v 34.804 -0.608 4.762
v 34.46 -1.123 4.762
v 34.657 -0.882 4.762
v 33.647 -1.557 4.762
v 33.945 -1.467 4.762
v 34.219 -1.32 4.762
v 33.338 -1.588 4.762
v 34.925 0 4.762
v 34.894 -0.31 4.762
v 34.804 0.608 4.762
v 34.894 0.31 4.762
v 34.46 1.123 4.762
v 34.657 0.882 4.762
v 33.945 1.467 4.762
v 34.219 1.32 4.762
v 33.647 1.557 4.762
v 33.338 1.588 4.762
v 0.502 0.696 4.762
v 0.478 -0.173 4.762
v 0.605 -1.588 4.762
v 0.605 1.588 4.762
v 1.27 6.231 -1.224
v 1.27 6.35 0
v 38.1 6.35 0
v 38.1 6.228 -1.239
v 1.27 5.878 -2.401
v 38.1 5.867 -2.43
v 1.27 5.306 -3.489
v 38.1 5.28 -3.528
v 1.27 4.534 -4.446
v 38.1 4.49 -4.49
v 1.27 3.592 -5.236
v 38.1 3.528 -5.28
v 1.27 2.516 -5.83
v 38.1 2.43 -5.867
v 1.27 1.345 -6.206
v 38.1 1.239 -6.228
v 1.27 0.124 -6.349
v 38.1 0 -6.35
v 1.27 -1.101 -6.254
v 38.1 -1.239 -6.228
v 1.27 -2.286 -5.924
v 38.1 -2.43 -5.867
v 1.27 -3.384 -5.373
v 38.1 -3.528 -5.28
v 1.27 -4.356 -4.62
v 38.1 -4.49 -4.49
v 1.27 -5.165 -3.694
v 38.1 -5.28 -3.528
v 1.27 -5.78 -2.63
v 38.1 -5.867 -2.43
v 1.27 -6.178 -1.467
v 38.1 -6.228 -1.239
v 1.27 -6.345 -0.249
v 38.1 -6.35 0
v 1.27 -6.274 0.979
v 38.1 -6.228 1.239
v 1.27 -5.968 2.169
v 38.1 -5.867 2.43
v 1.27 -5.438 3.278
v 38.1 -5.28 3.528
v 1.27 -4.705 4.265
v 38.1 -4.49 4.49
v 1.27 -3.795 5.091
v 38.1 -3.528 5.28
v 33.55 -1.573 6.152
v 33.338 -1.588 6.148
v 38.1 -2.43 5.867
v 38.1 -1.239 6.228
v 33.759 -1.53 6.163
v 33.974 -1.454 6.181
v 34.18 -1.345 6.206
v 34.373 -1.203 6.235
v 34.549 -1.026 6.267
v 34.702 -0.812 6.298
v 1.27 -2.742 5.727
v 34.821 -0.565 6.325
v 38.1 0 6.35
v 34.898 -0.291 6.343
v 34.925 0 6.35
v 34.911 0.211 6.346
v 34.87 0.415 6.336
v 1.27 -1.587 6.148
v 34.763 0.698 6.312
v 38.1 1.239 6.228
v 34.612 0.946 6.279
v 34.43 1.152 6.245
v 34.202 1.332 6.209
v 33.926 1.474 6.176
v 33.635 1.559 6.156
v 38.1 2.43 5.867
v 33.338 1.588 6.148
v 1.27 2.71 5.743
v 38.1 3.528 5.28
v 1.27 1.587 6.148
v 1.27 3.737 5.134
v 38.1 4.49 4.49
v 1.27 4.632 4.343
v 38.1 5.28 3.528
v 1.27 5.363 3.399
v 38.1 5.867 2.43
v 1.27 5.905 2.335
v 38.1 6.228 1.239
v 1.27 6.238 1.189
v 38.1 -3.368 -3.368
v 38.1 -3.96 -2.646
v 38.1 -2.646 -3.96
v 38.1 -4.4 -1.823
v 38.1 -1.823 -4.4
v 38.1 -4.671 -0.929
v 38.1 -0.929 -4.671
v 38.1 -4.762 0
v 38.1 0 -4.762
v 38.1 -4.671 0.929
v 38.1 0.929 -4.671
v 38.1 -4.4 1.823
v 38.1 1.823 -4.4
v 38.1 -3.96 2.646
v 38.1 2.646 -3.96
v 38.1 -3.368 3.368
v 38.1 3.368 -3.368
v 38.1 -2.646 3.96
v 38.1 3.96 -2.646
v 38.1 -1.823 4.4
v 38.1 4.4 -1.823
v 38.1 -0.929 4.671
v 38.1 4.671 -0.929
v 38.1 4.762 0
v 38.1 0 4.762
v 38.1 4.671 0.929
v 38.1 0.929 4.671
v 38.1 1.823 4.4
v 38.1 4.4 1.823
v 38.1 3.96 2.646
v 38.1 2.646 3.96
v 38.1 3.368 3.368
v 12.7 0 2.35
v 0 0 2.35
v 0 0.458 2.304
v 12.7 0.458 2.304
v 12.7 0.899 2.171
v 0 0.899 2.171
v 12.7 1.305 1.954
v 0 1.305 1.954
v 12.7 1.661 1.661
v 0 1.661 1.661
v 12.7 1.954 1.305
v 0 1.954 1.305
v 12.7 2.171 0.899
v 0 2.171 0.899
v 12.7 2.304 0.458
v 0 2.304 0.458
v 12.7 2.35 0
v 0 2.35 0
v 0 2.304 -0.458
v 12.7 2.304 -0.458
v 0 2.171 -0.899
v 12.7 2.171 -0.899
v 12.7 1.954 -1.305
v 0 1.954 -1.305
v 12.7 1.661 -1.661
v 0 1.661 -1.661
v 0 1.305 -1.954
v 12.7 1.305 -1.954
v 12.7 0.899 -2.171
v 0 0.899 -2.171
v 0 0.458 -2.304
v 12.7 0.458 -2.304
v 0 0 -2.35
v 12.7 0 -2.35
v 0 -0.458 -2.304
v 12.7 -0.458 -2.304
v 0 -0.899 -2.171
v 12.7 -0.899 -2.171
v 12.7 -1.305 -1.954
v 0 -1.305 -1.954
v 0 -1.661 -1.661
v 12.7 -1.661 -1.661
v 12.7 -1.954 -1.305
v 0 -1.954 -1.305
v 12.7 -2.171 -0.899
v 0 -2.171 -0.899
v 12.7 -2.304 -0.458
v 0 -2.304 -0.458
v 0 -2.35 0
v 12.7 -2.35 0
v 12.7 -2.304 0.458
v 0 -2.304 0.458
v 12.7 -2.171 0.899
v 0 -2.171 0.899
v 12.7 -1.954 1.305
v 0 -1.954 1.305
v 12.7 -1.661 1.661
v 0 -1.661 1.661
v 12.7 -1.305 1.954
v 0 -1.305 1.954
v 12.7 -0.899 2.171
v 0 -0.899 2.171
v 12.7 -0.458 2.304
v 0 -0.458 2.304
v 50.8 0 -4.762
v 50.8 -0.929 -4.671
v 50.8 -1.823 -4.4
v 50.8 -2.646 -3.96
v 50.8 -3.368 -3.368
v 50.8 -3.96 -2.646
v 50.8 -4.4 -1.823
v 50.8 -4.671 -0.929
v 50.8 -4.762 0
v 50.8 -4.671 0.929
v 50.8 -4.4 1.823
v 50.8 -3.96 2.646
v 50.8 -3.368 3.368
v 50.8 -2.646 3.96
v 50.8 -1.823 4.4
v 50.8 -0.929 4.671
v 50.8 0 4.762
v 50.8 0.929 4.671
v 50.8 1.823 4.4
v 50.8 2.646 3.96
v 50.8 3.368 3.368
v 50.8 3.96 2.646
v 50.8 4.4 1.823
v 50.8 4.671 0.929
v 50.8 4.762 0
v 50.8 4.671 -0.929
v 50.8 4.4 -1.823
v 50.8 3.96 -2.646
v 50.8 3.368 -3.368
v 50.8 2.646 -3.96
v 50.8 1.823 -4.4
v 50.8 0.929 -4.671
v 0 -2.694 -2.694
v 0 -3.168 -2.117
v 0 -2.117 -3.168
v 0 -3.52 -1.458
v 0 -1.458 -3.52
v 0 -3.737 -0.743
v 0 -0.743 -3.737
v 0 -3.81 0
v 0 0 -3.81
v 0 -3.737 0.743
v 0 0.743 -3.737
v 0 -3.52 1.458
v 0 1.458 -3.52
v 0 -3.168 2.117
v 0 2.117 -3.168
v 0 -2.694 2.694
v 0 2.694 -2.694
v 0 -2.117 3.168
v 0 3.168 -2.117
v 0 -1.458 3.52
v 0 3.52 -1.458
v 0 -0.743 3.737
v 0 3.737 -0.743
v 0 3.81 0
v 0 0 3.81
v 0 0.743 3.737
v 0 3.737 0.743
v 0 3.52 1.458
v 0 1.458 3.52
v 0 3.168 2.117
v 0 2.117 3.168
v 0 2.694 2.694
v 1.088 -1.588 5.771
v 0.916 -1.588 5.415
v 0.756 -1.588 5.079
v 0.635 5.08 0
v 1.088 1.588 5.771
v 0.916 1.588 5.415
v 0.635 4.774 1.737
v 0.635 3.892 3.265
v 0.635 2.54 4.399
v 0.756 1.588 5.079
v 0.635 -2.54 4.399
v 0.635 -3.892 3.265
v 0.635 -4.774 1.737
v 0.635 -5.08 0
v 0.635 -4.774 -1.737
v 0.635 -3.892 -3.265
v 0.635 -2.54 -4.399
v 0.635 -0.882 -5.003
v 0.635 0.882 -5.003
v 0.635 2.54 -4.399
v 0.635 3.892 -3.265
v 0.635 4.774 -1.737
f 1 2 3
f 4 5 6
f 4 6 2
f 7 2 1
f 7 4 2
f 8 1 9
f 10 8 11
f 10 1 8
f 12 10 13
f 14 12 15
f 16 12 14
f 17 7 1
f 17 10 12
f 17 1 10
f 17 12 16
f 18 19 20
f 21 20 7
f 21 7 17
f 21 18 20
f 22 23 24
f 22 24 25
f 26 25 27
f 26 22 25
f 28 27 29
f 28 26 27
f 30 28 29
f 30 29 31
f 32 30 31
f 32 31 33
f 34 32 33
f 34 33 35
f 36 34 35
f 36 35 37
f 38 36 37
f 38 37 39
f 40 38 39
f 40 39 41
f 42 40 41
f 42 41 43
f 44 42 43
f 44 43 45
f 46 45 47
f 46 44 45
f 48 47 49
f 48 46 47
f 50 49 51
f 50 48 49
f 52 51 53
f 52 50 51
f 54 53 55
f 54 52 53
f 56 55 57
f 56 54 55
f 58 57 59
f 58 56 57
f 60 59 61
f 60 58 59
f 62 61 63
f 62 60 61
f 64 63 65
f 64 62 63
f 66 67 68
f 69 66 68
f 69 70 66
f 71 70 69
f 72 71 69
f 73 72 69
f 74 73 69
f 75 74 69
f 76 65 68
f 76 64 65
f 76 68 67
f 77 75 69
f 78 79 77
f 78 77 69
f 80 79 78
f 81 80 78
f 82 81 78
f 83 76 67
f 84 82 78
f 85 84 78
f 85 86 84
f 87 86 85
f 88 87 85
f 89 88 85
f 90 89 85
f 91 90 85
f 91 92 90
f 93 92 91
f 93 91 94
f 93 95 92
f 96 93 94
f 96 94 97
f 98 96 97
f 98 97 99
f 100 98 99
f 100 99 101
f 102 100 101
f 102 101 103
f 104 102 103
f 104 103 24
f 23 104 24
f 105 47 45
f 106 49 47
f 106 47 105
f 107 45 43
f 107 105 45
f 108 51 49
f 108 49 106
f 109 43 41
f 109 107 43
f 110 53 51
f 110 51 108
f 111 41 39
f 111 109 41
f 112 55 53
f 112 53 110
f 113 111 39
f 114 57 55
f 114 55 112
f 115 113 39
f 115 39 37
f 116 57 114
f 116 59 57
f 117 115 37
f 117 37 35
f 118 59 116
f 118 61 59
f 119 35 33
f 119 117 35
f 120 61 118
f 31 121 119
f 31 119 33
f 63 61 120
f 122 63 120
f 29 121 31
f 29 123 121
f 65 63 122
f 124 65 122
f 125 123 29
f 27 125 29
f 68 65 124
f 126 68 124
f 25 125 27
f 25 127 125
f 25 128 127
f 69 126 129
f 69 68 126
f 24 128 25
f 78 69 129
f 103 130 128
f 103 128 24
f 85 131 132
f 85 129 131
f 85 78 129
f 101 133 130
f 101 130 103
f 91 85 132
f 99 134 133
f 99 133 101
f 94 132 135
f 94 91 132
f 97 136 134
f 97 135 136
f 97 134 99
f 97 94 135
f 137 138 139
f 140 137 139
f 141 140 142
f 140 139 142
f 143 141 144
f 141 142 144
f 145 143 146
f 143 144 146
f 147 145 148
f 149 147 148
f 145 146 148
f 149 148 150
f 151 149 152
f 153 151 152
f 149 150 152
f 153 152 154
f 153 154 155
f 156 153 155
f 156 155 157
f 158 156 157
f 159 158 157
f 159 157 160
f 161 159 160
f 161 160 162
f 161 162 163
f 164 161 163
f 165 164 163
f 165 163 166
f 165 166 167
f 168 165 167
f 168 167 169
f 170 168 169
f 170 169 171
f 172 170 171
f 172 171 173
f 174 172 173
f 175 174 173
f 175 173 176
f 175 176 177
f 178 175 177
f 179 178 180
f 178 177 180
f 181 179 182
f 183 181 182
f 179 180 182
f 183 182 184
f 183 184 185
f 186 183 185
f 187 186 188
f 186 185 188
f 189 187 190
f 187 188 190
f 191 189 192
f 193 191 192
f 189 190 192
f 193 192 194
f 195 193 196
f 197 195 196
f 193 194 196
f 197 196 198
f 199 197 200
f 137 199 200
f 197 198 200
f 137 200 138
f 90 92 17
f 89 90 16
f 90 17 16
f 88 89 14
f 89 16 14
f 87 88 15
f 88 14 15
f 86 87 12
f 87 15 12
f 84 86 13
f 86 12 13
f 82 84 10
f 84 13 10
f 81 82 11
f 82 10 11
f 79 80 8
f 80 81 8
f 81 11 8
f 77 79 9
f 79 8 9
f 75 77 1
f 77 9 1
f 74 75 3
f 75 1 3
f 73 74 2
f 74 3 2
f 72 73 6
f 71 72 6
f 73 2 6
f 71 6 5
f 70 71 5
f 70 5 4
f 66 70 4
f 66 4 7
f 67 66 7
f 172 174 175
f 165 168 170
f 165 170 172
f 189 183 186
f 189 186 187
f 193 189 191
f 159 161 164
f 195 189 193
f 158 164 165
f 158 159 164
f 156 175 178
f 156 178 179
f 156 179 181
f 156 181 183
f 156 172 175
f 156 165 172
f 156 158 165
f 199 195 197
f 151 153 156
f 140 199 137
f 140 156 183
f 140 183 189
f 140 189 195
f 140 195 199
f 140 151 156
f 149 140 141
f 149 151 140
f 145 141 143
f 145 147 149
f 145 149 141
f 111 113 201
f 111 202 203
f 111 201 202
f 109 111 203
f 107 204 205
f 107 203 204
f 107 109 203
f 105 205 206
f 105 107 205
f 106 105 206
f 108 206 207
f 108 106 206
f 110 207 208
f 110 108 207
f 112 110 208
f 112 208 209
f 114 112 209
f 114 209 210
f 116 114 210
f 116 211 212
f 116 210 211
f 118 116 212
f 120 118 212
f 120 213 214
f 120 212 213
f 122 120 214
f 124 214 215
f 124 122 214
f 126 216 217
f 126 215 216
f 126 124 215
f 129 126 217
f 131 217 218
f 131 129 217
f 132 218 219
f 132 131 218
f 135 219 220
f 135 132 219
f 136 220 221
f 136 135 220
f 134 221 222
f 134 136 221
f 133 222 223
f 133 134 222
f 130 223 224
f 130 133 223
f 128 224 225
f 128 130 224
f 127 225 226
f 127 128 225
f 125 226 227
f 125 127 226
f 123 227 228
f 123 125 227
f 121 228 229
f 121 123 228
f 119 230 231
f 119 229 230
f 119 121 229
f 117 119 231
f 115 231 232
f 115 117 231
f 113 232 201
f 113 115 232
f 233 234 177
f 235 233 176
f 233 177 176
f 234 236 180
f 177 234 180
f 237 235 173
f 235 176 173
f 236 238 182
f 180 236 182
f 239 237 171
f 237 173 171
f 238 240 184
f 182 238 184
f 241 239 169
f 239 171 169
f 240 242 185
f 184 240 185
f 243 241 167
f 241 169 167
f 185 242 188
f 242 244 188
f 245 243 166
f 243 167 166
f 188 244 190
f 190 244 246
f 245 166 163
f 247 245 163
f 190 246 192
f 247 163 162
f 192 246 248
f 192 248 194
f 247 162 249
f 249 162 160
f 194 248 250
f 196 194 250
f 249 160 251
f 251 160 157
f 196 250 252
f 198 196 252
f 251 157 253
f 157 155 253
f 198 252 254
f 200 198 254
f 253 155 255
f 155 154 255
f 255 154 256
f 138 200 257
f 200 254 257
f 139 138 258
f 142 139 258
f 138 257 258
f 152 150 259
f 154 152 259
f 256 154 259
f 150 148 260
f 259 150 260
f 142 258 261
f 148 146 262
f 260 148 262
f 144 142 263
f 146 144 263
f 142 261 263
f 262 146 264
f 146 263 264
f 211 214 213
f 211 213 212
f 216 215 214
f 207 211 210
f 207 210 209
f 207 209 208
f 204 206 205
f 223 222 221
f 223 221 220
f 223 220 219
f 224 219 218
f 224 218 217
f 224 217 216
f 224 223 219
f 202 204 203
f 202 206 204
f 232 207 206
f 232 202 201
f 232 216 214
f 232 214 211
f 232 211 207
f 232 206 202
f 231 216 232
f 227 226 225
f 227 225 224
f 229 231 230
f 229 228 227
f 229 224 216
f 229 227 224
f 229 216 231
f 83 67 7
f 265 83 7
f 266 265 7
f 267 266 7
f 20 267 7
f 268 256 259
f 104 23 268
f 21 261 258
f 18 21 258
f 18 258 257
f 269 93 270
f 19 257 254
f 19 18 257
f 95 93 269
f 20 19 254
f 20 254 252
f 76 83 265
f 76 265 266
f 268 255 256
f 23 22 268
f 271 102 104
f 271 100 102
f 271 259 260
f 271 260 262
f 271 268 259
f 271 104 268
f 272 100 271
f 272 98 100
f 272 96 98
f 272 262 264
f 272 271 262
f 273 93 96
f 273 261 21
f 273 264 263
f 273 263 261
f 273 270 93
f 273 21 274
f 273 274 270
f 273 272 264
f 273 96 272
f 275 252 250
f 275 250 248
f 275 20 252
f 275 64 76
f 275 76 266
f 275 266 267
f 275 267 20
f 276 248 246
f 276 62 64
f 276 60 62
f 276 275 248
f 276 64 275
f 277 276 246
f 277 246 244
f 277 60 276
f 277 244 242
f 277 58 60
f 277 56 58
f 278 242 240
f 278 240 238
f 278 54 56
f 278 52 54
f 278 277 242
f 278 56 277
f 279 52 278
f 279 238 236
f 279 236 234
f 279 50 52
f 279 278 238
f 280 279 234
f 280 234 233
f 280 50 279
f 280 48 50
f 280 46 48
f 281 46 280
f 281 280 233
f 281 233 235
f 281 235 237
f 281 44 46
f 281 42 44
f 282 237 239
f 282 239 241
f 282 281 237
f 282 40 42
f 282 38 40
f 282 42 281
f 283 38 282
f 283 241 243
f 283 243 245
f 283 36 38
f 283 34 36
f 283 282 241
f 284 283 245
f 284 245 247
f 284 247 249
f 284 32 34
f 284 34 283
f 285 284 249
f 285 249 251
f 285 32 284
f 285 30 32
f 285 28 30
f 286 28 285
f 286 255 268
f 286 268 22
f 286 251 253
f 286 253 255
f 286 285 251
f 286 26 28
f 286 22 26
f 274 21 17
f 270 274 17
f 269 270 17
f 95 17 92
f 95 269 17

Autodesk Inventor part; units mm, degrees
ref_plane "YZ Plane" through (0, 0, 0) normal (1, 0, 0) x (0, 1, 0)
ref_plane "XZ Plane" through (0, 0, 0) normal (0, 1, 0) x (-1, 0, 0)
ref_plane "XY Plane" through (0, 0, 0) normal (0, 0, 1) x (1, 0, 0)
sketch "Sketch1" plane through (0, 0, 0) normal (1, 0, 0) x (0, 1, 0)
  circle A0 centre (0, 0) radius 6.35
  line L0 (0, 0) -> (0, 6.35) construction
  line L1 (-1.5875, 6.1484) -> (-1.5875, 4.7625)
  line L2 (-1.5875, 4.7625) -> (1.5875, 4.7625)
  line L3 (1.5875, 4.7625) -> (1.5875, 6.1484)
  point P0 (0, 4.7625)
  dimension "d0" = 12.7
  dimension "d2" = 1.5875
  dimension "d3" = 3.175
extrude "Extrusion1" add sketch "Sketch1" along normal blind 38.1
sketch "Sketch2" plane through (38.1, 0, 0) normal (1, 0, 0) x (0, 0, -1)
  circle A0 centre (0, 0) radius 6.35 projected
  circle A1 centre (0, 0) radius 4.7625
  dimension "d6" = 9.525
extrude "Extrusion2" add sketch "Sketch2" along normal blind 12.7 contours A1
extrude "Extrusion3" cut sketch "Sketch1" along normal blind 34.925 contours L3 L2 L1 A0 picked at (0.1781, 5.2842)
fillet "Fillet1" radius 1.5875 2 edges at (34.925, 1.5875, 5.4554) (34.925, -1.5875, 5.4554)
chamfer "Chamfer1" distance 1.27 distance2 2.54 1 edges at (0, 0, -6.35) measured on face at (25.4, -3.3725, 5.3804)
sketch "Sketch3" plane through (0, 0, 0) normal (-1, 0, 0) x (0, 0, 1)
  circle A0 centre (0, 0) radius 3.81 projected
  circle A1 centre (0, 0) radius 2.3495
  dimension "d16" = 4.699
extrude "Extrusion4" cut sketch "Sketch3" against normal blind 12.7 contours A1
thread "Thread1" size "10-32 UNF" class "2B" standard "ANSI Unified Screw Threads" full length
properties part number "Banebots 0.5x1.5 P60 Shaft" material "Steel, Carbon"
